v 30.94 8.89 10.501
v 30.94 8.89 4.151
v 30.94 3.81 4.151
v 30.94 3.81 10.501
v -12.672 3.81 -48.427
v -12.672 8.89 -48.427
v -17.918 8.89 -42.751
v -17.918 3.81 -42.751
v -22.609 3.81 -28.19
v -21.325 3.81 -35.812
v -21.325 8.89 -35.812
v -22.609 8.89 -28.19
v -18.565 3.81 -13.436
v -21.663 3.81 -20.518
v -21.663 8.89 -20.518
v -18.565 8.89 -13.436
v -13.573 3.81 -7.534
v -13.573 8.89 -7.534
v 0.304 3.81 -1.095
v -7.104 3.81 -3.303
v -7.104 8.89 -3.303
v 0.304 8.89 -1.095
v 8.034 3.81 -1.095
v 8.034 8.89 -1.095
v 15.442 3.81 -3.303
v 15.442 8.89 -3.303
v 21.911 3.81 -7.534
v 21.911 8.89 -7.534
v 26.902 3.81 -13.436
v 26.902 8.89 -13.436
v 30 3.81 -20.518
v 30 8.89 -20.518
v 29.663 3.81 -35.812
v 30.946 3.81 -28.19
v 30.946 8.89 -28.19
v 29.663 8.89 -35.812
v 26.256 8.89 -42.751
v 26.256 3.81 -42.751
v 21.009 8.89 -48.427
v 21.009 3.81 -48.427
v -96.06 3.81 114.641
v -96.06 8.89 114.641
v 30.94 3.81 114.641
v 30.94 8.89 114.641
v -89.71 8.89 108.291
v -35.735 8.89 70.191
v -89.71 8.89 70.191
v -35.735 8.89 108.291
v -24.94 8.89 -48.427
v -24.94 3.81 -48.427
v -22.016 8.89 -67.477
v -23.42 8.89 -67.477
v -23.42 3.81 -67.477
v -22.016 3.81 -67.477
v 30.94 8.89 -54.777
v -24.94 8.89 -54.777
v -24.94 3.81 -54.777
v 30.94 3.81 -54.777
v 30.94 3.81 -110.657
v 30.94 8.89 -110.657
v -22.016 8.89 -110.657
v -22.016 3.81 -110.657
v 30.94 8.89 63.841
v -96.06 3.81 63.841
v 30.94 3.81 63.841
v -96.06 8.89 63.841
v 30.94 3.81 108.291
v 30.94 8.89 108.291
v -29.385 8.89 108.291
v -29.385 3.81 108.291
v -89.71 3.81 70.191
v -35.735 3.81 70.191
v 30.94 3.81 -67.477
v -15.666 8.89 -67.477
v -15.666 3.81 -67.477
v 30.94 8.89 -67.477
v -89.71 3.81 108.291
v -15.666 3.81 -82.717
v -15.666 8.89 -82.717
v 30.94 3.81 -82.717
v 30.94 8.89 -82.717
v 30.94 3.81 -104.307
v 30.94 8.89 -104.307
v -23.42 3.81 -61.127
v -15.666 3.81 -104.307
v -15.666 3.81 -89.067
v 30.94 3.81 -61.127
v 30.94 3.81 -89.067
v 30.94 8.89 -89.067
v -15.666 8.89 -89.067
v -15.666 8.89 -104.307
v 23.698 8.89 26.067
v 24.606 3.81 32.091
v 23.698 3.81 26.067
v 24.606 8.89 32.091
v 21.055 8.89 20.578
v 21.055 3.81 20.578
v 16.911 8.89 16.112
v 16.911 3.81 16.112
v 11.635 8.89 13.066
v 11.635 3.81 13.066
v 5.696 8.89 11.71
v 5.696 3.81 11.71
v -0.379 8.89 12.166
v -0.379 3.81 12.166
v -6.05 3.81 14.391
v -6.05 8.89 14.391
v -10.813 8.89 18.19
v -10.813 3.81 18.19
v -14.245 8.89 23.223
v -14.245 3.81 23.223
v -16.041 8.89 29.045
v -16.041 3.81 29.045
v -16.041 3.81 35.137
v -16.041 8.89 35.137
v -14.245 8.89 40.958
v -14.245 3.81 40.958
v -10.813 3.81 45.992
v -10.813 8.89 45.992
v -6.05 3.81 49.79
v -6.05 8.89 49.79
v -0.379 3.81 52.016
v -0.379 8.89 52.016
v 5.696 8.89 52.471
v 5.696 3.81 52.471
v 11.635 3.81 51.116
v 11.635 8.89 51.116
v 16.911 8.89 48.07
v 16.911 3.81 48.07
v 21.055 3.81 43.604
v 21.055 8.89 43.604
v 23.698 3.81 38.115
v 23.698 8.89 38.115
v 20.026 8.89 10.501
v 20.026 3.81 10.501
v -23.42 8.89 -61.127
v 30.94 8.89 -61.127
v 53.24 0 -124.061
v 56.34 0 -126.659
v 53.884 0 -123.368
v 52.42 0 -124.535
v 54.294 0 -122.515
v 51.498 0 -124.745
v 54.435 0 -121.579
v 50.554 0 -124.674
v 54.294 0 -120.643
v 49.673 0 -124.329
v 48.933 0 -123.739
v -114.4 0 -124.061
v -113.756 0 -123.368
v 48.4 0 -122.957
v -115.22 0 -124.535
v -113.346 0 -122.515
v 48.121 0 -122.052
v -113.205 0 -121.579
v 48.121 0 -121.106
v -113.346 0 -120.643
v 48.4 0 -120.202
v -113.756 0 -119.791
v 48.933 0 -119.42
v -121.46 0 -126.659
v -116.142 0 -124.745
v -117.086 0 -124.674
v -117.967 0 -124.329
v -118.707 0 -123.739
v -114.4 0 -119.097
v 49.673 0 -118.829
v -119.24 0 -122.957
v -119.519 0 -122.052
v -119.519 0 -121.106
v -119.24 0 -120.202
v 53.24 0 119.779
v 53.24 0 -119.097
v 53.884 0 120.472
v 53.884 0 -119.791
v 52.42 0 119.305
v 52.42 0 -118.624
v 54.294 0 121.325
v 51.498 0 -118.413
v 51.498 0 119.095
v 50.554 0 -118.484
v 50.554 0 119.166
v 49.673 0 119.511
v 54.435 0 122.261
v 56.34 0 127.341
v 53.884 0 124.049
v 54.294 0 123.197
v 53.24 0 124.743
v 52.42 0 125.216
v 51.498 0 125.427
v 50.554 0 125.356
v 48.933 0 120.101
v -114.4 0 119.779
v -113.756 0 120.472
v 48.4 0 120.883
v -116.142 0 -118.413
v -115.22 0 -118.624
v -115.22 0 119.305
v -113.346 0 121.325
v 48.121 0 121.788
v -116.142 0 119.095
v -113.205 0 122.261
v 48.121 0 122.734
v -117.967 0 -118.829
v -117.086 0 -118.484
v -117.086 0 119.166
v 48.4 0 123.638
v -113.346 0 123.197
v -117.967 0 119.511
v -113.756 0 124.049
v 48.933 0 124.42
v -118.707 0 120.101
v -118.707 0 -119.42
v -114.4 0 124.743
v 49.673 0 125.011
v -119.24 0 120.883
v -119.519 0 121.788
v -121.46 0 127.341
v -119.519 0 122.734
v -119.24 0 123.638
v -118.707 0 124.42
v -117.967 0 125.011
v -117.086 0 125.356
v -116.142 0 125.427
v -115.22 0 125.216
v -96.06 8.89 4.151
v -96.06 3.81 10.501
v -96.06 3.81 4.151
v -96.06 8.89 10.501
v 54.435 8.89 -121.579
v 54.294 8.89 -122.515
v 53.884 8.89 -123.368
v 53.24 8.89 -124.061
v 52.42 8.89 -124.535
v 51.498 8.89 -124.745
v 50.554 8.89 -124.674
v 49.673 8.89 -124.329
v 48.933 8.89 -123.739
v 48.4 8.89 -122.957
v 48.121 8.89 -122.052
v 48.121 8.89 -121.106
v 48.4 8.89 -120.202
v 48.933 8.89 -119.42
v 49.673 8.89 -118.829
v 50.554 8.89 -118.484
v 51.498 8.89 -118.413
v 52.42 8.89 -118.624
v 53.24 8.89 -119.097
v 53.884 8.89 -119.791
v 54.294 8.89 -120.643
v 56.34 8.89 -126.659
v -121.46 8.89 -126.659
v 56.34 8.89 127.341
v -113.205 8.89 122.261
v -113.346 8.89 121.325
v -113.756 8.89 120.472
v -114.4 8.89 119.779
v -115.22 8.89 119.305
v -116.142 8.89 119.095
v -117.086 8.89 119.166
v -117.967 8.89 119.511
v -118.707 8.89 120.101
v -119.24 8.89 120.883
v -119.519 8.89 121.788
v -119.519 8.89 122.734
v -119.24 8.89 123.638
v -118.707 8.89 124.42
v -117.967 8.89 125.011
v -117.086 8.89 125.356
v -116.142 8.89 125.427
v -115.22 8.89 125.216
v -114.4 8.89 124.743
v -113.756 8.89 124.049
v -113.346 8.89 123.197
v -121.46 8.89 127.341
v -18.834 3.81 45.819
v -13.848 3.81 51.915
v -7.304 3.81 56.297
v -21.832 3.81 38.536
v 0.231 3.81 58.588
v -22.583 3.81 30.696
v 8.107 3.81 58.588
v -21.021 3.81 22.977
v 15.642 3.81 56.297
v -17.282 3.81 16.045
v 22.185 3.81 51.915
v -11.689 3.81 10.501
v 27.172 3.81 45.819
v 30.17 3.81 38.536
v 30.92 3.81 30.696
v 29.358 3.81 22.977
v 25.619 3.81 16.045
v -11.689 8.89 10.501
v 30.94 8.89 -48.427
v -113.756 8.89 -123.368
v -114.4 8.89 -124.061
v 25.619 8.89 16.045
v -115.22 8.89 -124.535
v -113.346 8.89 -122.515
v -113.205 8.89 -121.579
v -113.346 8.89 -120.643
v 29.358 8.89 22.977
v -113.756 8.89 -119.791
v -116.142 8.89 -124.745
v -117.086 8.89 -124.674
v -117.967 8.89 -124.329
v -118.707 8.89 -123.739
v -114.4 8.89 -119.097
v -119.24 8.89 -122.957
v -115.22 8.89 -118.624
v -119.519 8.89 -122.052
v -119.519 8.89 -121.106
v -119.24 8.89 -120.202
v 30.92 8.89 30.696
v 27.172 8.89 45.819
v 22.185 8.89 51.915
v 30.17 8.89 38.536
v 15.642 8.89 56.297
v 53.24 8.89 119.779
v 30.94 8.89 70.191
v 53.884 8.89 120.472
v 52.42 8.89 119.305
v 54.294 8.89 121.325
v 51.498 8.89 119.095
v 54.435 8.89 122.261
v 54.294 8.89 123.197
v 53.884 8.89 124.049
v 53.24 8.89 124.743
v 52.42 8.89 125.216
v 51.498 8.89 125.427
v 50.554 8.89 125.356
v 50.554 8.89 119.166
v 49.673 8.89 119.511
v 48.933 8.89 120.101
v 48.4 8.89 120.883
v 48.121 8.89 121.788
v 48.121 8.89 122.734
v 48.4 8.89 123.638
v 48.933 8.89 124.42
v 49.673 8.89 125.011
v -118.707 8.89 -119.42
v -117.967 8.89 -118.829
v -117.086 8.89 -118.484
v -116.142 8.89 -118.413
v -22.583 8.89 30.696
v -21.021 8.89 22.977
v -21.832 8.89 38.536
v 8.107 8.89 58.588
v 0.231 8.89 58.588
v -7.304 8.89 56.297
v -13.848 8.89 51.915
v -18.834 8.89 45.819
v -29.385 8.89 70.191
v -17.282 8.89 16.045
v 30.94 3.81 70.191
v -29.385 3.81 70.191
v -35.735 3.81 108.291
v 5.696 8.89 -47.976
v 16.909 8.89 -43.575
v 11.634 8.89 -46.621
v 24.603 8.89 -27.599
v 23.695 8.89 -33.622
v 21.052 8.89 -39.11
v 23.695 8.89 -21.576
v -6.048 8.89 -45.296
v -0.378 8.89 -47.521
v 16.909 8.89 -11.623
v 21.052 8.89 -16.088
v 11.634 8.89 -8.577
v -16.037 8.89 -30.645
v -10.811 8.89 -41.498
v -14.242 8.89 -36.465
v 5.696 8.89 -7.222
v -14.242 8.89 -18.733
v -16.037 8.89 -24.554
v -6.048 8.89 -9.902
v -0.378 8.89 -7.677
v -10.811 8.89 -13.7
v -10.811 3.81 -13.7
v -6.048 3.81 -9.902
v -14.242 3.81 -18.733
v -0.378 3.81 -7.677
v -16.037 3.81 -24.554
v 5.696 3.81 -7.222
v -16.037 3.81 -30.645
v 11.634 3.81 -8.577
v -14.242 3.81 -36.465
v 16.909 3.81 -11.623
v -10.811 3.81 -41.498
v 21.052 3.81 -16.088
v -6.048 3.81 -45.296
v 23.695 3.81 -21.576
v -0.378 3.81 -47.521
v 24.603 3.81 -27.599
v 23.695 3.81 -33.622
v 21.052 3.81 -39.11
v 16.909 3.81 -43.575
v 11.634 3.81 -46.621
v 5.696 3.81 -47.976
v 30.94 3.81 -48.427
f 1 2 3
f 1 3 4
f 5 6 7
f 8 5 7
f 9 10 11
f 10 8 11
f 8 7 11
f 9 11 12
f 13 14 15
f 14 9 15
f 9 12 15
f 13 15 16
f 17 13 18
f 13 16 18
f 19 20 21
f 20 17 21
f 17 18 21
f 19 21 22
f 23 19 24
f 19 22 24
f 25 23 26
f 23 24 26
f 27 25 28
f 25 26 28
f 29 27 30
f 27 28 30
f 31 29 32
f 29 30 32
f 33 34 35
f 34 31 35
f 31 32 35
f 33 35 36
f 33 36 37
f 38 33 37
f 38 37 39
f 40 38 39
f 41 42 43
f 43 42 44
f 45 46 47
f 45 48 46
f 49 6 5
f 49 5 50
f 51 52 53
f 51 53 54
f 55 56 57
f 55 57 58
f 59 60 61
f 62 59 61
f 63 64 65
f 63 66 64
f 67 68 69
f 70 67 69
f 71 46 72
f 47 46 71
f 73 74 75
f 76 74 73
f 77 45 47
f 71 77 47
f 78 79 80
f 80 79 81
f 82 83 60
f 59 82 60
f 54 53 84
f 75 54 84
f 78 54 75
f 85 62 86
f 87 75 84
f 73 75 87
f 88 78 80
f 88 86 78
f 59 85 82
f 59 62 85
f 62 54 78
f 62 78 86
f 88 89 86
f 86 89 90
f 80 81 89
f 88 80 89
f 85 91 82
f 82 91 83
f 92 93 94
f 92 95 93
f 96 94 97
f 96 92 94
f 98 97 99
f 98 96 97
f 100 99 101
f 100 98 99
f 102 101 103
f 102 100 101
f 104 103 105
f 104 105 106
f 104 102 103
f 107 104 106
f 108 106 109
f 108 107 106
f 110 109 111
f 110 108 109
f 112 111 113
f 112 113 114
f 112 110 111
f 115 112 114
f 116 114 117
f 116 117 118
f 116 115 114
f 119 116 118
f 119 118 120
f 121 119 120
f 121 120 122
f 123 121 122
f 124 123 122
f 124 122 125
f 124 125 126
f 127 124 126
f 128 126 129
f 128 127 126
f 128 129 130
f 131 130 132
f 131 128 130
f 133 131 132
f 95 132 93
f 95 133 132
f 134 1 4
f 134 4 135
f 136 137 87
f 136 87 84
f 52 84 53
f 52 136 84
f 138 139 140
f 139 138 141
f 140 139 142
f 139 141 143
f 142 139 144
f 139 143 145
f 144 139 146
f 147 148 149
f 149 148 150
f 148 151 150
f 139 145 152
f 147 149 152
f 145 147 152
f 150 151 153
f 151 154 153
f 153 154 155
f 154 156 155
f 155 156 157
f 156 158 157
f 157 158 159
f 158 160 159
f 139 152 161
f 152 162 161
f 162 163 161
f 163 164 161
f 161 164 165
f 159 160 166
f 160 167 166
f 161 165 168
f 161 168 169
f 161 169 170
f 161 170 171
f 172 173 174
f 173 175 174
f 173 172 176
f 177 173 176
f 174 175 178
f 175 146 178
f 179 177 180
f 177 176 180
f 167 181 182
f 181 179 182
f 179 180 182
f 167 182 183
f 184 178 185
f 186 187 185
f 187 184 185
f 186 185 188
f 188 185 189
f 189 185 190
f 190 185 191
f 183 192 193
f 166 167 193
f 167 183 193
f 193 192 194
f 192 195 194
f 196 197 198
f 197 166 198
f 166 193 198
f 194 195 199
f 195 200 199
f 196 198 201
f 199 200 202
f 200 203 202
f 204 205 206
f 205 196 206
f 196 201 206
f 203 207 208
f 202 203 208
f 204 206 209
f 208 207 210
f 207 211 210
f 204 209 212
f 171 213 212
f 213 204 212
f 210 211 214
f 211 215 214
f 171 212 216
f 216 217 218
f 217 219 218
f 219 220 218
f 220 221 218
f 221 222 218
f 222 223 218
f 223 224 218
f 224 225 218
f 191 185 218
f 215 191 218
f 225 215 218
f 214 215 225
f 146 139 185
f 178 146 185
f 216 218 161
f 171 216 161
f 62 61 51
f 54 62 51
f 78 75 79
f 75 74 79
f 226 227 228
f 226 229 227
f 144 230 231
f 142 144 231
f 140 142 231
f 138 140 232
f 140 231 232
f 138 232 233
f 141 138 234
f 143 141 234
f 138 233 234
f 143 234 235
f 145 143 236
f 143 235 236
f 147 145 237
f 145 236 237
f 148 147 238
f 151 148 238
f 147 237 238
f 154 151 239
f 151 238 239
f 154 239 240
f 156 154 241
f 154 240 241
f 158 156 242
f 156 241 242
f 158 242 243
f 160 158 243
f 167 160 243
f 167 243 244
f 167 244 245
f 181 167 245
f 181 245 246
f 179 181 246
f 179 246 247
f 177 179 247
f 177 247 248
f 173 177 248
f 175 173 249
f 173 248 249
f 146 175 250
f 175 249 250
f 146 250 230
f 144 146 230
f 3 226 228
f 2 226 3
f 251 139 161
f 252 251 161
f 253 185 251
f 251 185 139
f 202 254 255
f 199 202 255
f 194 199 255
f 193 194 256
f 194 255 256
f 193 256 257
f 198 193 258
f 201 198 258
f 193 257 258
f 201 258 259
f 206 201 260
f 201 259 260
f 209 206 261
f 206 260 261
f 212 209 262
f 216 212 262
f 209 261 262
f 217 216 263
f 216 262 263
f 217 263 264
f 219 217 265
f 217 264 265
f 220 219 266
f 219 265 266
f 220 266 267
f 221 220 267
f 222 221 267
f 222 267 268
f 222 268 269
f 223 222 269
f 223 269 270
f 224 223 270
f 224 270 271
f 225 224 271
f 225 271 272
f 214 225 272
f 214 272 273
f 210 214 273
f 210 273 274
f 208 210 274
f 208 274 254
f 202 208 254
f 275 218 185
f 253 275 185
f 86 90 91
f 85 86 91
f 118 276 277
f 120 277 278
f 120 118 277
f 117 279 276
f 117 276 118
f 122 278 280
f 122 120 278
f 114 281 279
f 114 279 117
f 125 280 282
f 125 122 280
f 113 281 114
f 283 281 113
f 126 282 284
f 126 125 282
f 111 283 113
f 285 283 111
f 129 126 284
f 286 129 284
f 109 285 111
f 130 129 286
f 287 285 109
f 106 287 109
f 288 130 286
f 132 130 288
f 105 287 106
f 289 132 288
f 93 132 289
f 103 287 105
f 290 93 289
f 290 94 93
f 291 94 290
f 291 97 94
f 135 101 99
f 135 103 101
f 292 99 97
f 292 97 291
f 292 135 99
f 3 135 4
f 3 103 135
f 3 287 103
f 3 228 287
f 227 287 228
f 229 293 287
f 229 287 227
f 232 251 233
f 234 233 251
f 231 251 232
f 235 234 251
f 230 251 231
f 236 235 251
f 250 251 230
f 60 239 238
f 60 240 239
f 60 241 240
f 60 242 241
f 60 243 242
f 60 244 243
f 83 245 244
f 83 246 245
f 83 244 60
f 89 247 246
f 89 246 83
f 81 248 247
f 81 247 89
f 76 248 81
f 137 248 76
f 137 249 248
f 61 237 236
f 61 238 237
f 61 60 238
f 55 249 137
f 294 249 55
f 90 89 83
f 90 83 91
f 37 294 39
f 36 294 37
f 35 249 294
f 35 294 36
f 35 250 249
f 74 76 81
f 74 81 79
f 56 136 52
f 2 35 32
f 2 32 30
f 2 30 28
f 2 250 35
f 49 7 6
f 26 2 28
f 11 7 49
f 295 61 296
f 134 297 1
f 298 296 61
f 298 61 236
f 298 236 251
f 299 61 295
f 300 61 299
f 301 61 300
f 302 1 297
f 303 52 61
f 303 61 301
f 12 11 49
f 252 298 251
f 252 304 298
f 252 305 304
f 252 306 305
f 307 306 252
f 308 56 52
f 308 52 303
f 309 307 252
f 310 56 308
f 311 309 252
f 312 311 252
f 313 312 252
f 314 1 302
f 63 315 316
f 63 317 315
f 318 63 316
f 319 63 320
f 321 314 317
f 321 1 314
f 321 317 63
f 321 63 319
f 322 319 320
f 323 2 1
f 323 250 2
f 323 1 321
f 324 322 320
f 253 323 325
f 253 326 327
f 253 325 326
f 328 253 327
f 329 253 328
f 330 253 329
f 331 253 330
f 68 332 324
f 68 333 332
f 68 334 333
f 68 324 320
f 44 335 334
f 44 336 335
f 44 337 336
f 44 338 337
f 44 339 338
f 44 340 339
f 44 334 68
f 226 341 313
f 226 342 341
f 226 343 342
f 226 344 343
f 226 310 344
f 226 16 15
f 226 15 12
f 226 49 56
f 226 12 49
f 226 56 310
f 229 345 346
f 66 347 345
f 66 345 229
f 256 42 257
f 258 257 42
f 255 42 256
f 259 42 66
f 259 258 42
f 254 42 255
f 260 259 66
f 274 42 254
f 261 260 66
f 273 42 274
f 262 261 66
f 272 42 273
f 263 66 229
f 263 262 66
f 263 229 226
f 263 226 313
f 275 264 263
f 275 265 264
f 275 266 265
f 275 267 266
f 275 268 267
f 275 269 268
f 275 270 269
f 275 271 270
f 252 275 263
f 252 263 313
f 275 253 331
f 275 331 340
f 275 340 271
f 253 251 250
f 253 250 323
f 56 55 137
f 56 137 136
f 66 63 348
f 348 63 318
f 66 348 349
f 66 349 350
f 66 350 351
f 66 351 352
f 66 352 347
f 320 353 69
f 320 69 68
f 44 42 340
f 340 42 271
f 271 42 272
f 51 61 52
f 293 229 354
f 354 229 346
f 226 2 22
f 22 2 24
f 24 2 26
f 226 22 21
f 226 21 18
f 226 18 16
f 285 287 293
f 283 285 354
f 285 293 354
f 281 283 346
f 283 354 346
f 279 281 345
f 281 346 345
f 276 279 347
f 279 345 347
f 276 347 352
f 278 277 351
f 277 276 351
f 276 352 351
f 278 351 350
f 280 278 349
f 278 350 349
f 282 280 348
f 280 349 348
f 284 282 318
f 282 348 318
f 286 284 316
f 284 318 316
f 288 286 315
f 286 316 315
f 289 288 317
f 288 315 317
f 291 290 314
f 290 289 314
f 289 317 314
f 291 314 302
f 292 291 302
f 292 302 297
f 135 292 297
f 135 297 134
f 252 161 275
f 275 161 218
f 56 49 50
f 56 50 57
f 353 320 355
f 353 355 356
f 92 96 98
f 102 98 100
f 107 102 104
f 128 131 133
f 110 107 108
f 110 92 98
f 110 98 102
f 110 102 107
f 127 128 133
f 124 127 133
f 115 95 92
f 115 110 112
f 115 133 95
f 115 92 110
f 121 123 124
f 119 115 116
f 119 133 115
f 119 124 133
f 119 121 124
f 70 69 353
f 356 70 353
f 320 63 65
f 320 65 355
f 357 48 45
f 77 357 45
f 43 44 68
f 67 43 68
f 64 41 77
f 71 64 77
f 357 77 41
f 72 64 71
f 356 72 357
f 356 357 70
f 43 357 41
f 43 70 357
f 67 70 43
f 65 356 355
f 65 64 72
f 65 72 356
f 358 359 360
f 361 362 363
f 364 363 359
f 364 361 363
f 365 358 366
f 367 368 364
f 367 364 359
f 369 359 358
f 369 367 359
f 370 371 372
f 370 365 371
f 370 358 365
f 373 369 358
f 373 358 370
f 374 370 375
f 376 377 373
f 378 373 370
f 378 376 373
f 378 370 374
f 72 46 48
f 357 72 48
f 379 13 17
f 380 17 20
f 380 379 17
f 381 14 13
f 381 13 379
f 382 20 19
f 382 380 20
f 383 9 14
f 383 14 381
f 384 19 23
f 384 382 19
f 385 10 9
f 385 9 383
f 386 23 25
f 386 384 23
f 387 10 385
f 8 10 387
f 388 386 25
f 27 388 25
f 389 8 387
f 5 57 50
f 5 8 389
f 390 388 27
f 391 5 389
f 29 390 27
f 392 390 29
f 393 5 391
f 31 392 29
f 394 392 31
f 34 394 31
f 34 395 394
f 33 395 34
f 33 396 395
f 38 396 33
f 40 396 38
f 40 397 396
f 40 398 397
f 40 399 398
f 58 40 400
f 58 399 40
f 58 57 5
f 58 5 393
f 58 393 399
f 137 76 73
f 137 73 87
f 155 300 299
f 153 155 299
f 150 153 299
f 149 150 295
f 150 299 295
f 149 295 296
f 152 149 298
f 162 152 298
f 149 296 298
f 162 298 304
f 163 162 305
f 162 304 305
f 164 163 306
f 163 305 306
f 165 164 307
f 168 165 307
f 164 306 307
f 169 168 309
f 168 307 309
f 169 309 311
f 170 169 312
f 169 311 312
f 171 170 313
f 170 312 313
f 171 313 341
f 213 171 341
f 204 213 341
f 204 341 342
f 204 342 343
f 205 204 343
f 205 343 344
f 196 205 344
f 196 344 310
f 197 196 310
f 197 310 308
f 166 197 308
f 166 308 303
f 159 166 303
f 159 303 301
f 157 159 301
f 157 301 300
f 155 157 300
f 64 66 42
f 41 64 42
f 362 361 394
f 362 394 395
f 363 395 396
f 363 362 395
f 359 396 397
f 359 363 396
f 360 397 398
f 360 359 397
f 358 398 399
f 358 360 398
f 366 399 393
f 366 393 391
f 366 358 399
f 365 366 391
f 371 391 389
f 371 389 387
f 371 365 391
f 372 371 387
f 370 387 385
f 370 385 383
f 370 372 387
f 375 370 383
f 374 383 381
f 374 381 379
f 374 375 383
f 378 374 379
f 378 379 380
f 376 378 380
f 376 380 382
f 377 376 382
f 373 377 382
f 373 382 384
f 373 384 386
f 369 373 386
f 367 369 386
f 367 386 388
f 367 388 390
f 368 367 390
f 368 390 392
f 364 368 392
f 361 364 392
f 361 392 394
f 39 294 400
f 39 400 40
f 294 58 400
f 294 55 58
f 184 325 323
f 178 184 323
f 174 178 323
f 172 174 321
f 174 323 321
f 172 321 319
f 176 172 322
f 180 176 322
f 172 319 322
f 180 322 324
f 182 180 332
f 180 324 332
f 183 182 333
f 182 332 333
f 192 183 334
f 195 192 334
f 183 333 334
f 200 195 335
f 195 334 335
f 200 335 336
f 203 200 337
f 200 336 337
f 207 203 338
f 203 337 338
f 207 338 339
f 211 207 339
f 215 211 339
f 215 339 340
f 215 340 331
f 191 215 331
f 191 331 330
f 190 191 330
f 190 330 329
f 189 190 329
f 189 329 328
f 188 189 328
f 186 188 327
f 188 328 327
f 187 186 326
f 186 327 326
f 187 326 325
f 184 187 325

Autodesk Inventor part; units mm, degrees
ref_plane "YZ Plane" through (0, 0, 0) normal (1, 0, 0) x (0, 1, 0)
ref_plane "XZ Plane" through (0, 0, 0) normal (0, 1, 0) x (-1, 0, 0)
ref_plane "XY Plane" through (0, 0, 0) normal (0, 0, 1) x (1, 0, 0)
sketch "Sketch1" plane through (0, 0, 0) normal (0, 1, 0) x (-1, 0, 0)
  line L0 (121.4597, 127.3409) -> (-56.3403, 127.3409)
  line L1 (-56.3403, 127.3409) -> (-56.3403, -126.6591)
  line L2 (-56.3403, -126.6591) -> (121.4597, -126.6591)
  line L3 (121.4597, -126.6591) -> (121.4597, 127.3409)
  point P0 (0, 0)
  dimension "d0" = 254
  dimension "d1" = 177.8
sketch "Sketch2" plane through (0, 0, 0) normal (0, 1, 0) x (-1, 0, 0)
  point P0 (0, 0)
extrude "Extrusion1" add sketch "Sketch1" along normal blind 8.89
sketch "Sketch3" plane through (0, 8.89, 0) normal (0, 1, 0) x (1, 0, 0)
  line L0 (30.9403, -114.6409) -> (30.9403, -108.2909)
  line L1 (-121.4597, -127.3409) -> (56.3403, -127.3409) projected
  line L2 (56.3403, -127.3409) -> (56.3403, 126.6591) projected
  line L3 (30.9403, -108.2909) -> (-96.0597, -108.2909)
  line L4 (-96.0597, -108.2909) -> (-96.0597, -114.6409)
  line L5 (-96.0597, -114.6409) -> (30.9403, -114.6409)
  line L6 (-121.4597, 126.6591) -> (-121.4597, -127.3409) projected
  line L7 (-96.0597, -108.2909) -> (-89.7097, -108.2909)
  line L8 (-89.7097, -108.2909) -> (-89.7097, -63.8409)
  line L9 (-89.7097, -63.8409) -> (-96.0597, -63.8409)
  line L10 (-96.0597, -63.8409) -> (-96.0597, -108.2909)
  line L11 (-96.0597, -63.8409) -> (30.9403, -63.8409)
  line L12 (30.9403, -63.8409) -> (30.9403, -70.1909)
  line L13 (30.9403, -70.1909) -> (-96.0597, -70.1909)
  line L14 (-96.0597, -70.1909) -> (-96.0597, -63.8409)
  line L15 (-35.7347, -114.6409) -> (-29.3847, -114.6409)
  line L16 (-29.3847, -114.6409) -> (-29.3847, -63.8409)
  line L17 (-29.3847, -63.8409) -> (-35.7347, -63.8409)
  line L18 (-35.7347, -63.8409) -> (-35.7347, -114.6409)
  point P0 (0, 0)
  dimension "d4" = 6.35
  dimension "d5" = 12.7
  dimension "d6" = 25.4
  dimension "d7" = 25.4
  dimension "d8" = 6.35
  dimension "d10" = 127
  dimension "d11" = 6.35
  dimension "d12" = 50.8
  dimension "d13" = 6.35
  dimension "d14" = 60.325
  dimension "d15" = 60.325
sketch "Sketch4" plane through (0, 8.89, 0) normal (0, 1, 0) x (1, 0, 0)
  point P0 (0, 0)
extrude "Extrusion2" cut sketch "Sketch3" against normal blind 5.08 contours L5 L16 L3 L0 | L5 L18 L3 L16 | L3 L18 L13 L16 | L5 L4 L3 L18 | L16 L11 L12 L13 | L13 L18 L11 L16 | L3 L10 L13 L8 | L13 L8 L11 L18 | L13 L10 L9 L8
sketch "Sketch5" plane through (0, 8.89, 0) normal (0, 1, 0) x (1, 0, 0)
  line L0 (-96.0597, -4.1509) -> (30.9403, -4.1509)
  line L1 (30.9403, -4.1509) -> (30.9403, -10.5009)
  line L2 (30.9403, -10.5009) -> (-96.0597, -10.5009)
  line L3 (-96.0597, -10.5009) -> (-96.0597, -4.1509)
  line L4 (-96.0597, -63.8409) -> (30.9403, -63.8409) projected
  line L5 (-121.4597, 126.6591) -> (-121.4597, -127.3409) projected
  circle A0 centre (4.1687, -32.0909) radius 20.4377
  circle A1 centre (4.1687, -32.0909) radius 26.7877
  line L6 (56.3403, -127.3409) -> (56.3403, 126.6591) projected
  point P0 (0, 0)
  dimension "d18" = 53.34
  dimension "d19" = 6.35
  dimension "d20" = 127
  dimension "d21" = 25.4
  dimension "d22" = 6.35
  dimension "d23" = 21.59
  dimension "d24" = 100.2284
  dimension "d25" = 52.1716
sketch "Sketch6" plane through (0, 8.89, 0) normal (0, 1, 0) x (1, 0, 0)
  point P0 (0, 0)
extrude "Extrusion3" cut sketch "Sketch5" against normal blind 5.08
sketch "Sketch7" plane through (0, 8.89, 0) normal (0, 1, 0) x (1, 0, 0)
  line L0 (30.9403, 55.5391) -> (-32.5597, 55.5391)
  line L1 (-32.5597, 55.5391) -> (-32.5597, 48.0334)
  line L2 (-32.5597, 48.0334) -> (30.9403, 48.0334)
  line L3 (30.9403, 48.0334) -> (30.9403, 55.5391)
  line L4 (56.3403, -127.3409) -> (56.3403, 126.6591) projected
  line L5 (30.9403, -4.1509) -> (30.9403, -10.5009) projected
  circle A0 centre (4.1687, 27.5991) radius 20.4343
  circle A1 centre (4.1687, 27.5991) radius 26.7843
  line L6 (-96.0597, -4.1509) -> (30.9403, -4.1509) projected
  line L7 (-96.0597, -63.8409) -> (30.9403, -63.8409) projected
  arc A2 (-11.6885, -10.5009) -> (20.0259, -10.5009) centre (4.1687, -32.0909) ccw projected
  point P0 (0, 0)
  dimension "d31" = 25.4
  dimension "d35" = 31.75
  dimension "d37" = 27.94
  dimension "d39" = 27.94
  dimension "d40" = 63.5
  dimension "d42" = 25.4
  dimension "d43" = 26.7716
  dimension "d44" = 26.7716
  dimension "d45" = 31.75
  dimension "d46" = 6.35
sketch "Sketch9" plane through (0, 8.89, 0) normal (0, 1, 0) x (1, 0, 0)
  point P0 (0, 0)
extrude "Extrusion4" cut sketch "Sketch7" against normal blind 5.08 contours A1 L2 | L2 A1
sketch "Sketch12" plane through (0, 8.89, 0) normal (0, 1, 0) x (1, 0, 0)
  point P0 (0, 0)
sketch "Sketch13" plane through (0, 8.89, 0) normal (0, 1, 0) x (1, 0, 0)
  line L0 (30.9403, 48.4271) -> (-24.9397, 48.4271)
  line L1 (-24.9397, 48.4271) -> (-24.9397, 54.7771)
  line L2 (-24.9397, 54.7771) -> (30.9403, 54.7771)
  line L3 (30.9403, 54.7771) -> (30.9403, 48.4271)
  line L4 (56.3403, -127.3409) -> (56.3403, 126.6591) projected
  line L5 (-96.0597, -4.1509) -> (30.9403, -4.1509) projected
  point P0 (0, 0)
  dimension "d53" = 6.35
  dimension "d54" = 25.4
  dimension "d55" = 55.88
  dimension "d56" = 52.578
extrude "Extrusion5" cut sketch "Sketch13" against normal blind 5.08
sketch "Sketch15" plane through (0, 8.89, 0) normal (0, 1, 0) x (1, 0, 0)
  point P0 (0, 0)
sketch "Sketch16" plane through (0, 8.89, 0) normal (0, 1, 0) x (1, 0, 0)
  point P0 (0, 0)
sketch "Sketch14" plane through (0, 8.89, 0) normal (0, 1, 0) x (1, 0, 0)
  line L0 (30.9403, 61.1271) -> (-23.4198, 61.1271)
  line L1 (-23.4198, 61.1271) -> (-23.4198, 67.4771)
  line L2 (-23.4198, 67.4771) -> (30.9403, 67.4771)
  line L3 (30.9403, 67.4771) -> (30.9403, 61.1271)
  line L4 (-24.9397, 54.7771) -> (30.9403, 54.7771) projected
  line L5 (-22.0163, 67.4771) -> (-15.6663, 67.4771)
  line L6 (-15.6663, 67.4771) -> (-15.6663, 82.7171)
  line L7 (-15.6663, 82.7171) -> (-22.0163, 82.7171)
  line L8 (-22.0163, 82.7171) -> (-22.0163, 67.4771)
  line L9 (-22.0163, 82.7171) -> (30.9403, 82.7171)
  line L10 (30.9403, 82.7171) -> (30.9403, 89.0671)
  line L11 (30.9403, 89.0671) -> (-22.0163, 89.0671)
  line L12 (-22.0163, 89.0671) -> (-22.0163, 82.7171)
  line L13 (-22.0163, 89.0671) -> (-15.6663, 89.0671)
  line L14 (-15.6663, 89.0671) -> (-15.6663, 104.3071)
  line L15 (-15.6663, 104.3071) -> (-22.0163, 104.3071)
  line L16 (-22.0163, 104.3071) -> (-22.0163, 89.0671)
  line L17 (-22.0163, 104.3071) -> (30.9403, 104.3071)
  line L18 (30.9403, 104.3071) -> (30.9403, 110.6571)
  line L19 (30.9403, 110.6571) -> (-22.0163, 110.6571)
  line L20 (-22.0163, 110.6571) -> (-22.0163, 104.3071)
  point P0 (0, 0)
  dimension "d59" = 6.35
  dimension "d60" = 6.35
  dimension "d61" = 6.35
  dimension "d62" = 15.24
  dimension "d63" = 6.35
  dimension "d64" = 15.24
  dimension "d65" = 6.35
  dimension "d66" = 6.35
extrude "Extrusion6" cut sketch "Sketch14" against normal blind 5.08
sketch "Sketch19" plane through (0, 3.81, 0) normal (0, 1, 0) x (1, 0, 0)
  point P0 (0, 0)
sketch "Sketch21" plane through (0, 8.89, 0) normal (0, 1, 0) x (1, 0, 0)
  circle A0 centre (-116.3797, -122.2609) radius 3.175
  line L0 (-121.4597, 126.6591) -> (-121.4597, -127.3409) projected
  line L1 (-121.4597, -127.3409) -> (56.3403, -127.3409) projected
  point P0 (0, 0)
  dimension "d69" = 6.35
  dimension "d70" = 5.08
  dimension "d71" = 5.08
sketch "Sketch22" plane through (0, 8.89, 0) normal (0, 1, 0) x (1, 0, 0)
  circle A0 centre (51.2603, -122.2609) radius 3.175
  line L0 (56.3403, -127.3409) -> (56.3403, 126.6591) projected
  line L1 (-121.4597, -127.3409) -> (56.3403, -127.3409) projected
  circle A1 centre (-116.3797, 121.5791) radius 3.175
  line L2 (56.3403, 126.6591) -> (-121.4597, 126.6591) projected
  line L3 (-121.4597, 126.6591) -> (-121.4597, -127.3409) projected
  circle A2 centre (51.2603, 121.5791) radius 3.175
  point P0 (0, 0)
  dimension "d72" = 6.35
  dimension "d73" = 5.08
  dimension "d74" = 5.08
  dimension "d75" = 6.35
  dimension "d76" = 5.08
  dimension "d77" = 5.08
  dimension "d78" = 6.35
  dimension "d79" = 5.08
  dimension "d80" = 5.08
extrude "Extrusion7" cut sketch "Sketch22" against normal blind 25.4 contours A0 | A1 | A2
extrude "Extrusion8" cut sketch "Sketch21" against normal blind 25.4
equation "\"BendRadius\" = Thickness"
equation "\"BendReliefWidth\" = Thickness"
equation "\"BendReliefDepth\" = 0.5 * Thickness"
equation "\"CornerReliefSize\" = 4 * Thickness"
equation "\"MinimumRemnant\" = 2 * Thickness"
equation "\"TransitionRadius\" = BendRadius"
equation "\"JacobiRadiusSize\" = Thickness"
equation "\"GapSize\" = Thickness"
equation "\"Thickness\" = 3.048"
properties part number "Adam Name Plate" material "Aluminum"
